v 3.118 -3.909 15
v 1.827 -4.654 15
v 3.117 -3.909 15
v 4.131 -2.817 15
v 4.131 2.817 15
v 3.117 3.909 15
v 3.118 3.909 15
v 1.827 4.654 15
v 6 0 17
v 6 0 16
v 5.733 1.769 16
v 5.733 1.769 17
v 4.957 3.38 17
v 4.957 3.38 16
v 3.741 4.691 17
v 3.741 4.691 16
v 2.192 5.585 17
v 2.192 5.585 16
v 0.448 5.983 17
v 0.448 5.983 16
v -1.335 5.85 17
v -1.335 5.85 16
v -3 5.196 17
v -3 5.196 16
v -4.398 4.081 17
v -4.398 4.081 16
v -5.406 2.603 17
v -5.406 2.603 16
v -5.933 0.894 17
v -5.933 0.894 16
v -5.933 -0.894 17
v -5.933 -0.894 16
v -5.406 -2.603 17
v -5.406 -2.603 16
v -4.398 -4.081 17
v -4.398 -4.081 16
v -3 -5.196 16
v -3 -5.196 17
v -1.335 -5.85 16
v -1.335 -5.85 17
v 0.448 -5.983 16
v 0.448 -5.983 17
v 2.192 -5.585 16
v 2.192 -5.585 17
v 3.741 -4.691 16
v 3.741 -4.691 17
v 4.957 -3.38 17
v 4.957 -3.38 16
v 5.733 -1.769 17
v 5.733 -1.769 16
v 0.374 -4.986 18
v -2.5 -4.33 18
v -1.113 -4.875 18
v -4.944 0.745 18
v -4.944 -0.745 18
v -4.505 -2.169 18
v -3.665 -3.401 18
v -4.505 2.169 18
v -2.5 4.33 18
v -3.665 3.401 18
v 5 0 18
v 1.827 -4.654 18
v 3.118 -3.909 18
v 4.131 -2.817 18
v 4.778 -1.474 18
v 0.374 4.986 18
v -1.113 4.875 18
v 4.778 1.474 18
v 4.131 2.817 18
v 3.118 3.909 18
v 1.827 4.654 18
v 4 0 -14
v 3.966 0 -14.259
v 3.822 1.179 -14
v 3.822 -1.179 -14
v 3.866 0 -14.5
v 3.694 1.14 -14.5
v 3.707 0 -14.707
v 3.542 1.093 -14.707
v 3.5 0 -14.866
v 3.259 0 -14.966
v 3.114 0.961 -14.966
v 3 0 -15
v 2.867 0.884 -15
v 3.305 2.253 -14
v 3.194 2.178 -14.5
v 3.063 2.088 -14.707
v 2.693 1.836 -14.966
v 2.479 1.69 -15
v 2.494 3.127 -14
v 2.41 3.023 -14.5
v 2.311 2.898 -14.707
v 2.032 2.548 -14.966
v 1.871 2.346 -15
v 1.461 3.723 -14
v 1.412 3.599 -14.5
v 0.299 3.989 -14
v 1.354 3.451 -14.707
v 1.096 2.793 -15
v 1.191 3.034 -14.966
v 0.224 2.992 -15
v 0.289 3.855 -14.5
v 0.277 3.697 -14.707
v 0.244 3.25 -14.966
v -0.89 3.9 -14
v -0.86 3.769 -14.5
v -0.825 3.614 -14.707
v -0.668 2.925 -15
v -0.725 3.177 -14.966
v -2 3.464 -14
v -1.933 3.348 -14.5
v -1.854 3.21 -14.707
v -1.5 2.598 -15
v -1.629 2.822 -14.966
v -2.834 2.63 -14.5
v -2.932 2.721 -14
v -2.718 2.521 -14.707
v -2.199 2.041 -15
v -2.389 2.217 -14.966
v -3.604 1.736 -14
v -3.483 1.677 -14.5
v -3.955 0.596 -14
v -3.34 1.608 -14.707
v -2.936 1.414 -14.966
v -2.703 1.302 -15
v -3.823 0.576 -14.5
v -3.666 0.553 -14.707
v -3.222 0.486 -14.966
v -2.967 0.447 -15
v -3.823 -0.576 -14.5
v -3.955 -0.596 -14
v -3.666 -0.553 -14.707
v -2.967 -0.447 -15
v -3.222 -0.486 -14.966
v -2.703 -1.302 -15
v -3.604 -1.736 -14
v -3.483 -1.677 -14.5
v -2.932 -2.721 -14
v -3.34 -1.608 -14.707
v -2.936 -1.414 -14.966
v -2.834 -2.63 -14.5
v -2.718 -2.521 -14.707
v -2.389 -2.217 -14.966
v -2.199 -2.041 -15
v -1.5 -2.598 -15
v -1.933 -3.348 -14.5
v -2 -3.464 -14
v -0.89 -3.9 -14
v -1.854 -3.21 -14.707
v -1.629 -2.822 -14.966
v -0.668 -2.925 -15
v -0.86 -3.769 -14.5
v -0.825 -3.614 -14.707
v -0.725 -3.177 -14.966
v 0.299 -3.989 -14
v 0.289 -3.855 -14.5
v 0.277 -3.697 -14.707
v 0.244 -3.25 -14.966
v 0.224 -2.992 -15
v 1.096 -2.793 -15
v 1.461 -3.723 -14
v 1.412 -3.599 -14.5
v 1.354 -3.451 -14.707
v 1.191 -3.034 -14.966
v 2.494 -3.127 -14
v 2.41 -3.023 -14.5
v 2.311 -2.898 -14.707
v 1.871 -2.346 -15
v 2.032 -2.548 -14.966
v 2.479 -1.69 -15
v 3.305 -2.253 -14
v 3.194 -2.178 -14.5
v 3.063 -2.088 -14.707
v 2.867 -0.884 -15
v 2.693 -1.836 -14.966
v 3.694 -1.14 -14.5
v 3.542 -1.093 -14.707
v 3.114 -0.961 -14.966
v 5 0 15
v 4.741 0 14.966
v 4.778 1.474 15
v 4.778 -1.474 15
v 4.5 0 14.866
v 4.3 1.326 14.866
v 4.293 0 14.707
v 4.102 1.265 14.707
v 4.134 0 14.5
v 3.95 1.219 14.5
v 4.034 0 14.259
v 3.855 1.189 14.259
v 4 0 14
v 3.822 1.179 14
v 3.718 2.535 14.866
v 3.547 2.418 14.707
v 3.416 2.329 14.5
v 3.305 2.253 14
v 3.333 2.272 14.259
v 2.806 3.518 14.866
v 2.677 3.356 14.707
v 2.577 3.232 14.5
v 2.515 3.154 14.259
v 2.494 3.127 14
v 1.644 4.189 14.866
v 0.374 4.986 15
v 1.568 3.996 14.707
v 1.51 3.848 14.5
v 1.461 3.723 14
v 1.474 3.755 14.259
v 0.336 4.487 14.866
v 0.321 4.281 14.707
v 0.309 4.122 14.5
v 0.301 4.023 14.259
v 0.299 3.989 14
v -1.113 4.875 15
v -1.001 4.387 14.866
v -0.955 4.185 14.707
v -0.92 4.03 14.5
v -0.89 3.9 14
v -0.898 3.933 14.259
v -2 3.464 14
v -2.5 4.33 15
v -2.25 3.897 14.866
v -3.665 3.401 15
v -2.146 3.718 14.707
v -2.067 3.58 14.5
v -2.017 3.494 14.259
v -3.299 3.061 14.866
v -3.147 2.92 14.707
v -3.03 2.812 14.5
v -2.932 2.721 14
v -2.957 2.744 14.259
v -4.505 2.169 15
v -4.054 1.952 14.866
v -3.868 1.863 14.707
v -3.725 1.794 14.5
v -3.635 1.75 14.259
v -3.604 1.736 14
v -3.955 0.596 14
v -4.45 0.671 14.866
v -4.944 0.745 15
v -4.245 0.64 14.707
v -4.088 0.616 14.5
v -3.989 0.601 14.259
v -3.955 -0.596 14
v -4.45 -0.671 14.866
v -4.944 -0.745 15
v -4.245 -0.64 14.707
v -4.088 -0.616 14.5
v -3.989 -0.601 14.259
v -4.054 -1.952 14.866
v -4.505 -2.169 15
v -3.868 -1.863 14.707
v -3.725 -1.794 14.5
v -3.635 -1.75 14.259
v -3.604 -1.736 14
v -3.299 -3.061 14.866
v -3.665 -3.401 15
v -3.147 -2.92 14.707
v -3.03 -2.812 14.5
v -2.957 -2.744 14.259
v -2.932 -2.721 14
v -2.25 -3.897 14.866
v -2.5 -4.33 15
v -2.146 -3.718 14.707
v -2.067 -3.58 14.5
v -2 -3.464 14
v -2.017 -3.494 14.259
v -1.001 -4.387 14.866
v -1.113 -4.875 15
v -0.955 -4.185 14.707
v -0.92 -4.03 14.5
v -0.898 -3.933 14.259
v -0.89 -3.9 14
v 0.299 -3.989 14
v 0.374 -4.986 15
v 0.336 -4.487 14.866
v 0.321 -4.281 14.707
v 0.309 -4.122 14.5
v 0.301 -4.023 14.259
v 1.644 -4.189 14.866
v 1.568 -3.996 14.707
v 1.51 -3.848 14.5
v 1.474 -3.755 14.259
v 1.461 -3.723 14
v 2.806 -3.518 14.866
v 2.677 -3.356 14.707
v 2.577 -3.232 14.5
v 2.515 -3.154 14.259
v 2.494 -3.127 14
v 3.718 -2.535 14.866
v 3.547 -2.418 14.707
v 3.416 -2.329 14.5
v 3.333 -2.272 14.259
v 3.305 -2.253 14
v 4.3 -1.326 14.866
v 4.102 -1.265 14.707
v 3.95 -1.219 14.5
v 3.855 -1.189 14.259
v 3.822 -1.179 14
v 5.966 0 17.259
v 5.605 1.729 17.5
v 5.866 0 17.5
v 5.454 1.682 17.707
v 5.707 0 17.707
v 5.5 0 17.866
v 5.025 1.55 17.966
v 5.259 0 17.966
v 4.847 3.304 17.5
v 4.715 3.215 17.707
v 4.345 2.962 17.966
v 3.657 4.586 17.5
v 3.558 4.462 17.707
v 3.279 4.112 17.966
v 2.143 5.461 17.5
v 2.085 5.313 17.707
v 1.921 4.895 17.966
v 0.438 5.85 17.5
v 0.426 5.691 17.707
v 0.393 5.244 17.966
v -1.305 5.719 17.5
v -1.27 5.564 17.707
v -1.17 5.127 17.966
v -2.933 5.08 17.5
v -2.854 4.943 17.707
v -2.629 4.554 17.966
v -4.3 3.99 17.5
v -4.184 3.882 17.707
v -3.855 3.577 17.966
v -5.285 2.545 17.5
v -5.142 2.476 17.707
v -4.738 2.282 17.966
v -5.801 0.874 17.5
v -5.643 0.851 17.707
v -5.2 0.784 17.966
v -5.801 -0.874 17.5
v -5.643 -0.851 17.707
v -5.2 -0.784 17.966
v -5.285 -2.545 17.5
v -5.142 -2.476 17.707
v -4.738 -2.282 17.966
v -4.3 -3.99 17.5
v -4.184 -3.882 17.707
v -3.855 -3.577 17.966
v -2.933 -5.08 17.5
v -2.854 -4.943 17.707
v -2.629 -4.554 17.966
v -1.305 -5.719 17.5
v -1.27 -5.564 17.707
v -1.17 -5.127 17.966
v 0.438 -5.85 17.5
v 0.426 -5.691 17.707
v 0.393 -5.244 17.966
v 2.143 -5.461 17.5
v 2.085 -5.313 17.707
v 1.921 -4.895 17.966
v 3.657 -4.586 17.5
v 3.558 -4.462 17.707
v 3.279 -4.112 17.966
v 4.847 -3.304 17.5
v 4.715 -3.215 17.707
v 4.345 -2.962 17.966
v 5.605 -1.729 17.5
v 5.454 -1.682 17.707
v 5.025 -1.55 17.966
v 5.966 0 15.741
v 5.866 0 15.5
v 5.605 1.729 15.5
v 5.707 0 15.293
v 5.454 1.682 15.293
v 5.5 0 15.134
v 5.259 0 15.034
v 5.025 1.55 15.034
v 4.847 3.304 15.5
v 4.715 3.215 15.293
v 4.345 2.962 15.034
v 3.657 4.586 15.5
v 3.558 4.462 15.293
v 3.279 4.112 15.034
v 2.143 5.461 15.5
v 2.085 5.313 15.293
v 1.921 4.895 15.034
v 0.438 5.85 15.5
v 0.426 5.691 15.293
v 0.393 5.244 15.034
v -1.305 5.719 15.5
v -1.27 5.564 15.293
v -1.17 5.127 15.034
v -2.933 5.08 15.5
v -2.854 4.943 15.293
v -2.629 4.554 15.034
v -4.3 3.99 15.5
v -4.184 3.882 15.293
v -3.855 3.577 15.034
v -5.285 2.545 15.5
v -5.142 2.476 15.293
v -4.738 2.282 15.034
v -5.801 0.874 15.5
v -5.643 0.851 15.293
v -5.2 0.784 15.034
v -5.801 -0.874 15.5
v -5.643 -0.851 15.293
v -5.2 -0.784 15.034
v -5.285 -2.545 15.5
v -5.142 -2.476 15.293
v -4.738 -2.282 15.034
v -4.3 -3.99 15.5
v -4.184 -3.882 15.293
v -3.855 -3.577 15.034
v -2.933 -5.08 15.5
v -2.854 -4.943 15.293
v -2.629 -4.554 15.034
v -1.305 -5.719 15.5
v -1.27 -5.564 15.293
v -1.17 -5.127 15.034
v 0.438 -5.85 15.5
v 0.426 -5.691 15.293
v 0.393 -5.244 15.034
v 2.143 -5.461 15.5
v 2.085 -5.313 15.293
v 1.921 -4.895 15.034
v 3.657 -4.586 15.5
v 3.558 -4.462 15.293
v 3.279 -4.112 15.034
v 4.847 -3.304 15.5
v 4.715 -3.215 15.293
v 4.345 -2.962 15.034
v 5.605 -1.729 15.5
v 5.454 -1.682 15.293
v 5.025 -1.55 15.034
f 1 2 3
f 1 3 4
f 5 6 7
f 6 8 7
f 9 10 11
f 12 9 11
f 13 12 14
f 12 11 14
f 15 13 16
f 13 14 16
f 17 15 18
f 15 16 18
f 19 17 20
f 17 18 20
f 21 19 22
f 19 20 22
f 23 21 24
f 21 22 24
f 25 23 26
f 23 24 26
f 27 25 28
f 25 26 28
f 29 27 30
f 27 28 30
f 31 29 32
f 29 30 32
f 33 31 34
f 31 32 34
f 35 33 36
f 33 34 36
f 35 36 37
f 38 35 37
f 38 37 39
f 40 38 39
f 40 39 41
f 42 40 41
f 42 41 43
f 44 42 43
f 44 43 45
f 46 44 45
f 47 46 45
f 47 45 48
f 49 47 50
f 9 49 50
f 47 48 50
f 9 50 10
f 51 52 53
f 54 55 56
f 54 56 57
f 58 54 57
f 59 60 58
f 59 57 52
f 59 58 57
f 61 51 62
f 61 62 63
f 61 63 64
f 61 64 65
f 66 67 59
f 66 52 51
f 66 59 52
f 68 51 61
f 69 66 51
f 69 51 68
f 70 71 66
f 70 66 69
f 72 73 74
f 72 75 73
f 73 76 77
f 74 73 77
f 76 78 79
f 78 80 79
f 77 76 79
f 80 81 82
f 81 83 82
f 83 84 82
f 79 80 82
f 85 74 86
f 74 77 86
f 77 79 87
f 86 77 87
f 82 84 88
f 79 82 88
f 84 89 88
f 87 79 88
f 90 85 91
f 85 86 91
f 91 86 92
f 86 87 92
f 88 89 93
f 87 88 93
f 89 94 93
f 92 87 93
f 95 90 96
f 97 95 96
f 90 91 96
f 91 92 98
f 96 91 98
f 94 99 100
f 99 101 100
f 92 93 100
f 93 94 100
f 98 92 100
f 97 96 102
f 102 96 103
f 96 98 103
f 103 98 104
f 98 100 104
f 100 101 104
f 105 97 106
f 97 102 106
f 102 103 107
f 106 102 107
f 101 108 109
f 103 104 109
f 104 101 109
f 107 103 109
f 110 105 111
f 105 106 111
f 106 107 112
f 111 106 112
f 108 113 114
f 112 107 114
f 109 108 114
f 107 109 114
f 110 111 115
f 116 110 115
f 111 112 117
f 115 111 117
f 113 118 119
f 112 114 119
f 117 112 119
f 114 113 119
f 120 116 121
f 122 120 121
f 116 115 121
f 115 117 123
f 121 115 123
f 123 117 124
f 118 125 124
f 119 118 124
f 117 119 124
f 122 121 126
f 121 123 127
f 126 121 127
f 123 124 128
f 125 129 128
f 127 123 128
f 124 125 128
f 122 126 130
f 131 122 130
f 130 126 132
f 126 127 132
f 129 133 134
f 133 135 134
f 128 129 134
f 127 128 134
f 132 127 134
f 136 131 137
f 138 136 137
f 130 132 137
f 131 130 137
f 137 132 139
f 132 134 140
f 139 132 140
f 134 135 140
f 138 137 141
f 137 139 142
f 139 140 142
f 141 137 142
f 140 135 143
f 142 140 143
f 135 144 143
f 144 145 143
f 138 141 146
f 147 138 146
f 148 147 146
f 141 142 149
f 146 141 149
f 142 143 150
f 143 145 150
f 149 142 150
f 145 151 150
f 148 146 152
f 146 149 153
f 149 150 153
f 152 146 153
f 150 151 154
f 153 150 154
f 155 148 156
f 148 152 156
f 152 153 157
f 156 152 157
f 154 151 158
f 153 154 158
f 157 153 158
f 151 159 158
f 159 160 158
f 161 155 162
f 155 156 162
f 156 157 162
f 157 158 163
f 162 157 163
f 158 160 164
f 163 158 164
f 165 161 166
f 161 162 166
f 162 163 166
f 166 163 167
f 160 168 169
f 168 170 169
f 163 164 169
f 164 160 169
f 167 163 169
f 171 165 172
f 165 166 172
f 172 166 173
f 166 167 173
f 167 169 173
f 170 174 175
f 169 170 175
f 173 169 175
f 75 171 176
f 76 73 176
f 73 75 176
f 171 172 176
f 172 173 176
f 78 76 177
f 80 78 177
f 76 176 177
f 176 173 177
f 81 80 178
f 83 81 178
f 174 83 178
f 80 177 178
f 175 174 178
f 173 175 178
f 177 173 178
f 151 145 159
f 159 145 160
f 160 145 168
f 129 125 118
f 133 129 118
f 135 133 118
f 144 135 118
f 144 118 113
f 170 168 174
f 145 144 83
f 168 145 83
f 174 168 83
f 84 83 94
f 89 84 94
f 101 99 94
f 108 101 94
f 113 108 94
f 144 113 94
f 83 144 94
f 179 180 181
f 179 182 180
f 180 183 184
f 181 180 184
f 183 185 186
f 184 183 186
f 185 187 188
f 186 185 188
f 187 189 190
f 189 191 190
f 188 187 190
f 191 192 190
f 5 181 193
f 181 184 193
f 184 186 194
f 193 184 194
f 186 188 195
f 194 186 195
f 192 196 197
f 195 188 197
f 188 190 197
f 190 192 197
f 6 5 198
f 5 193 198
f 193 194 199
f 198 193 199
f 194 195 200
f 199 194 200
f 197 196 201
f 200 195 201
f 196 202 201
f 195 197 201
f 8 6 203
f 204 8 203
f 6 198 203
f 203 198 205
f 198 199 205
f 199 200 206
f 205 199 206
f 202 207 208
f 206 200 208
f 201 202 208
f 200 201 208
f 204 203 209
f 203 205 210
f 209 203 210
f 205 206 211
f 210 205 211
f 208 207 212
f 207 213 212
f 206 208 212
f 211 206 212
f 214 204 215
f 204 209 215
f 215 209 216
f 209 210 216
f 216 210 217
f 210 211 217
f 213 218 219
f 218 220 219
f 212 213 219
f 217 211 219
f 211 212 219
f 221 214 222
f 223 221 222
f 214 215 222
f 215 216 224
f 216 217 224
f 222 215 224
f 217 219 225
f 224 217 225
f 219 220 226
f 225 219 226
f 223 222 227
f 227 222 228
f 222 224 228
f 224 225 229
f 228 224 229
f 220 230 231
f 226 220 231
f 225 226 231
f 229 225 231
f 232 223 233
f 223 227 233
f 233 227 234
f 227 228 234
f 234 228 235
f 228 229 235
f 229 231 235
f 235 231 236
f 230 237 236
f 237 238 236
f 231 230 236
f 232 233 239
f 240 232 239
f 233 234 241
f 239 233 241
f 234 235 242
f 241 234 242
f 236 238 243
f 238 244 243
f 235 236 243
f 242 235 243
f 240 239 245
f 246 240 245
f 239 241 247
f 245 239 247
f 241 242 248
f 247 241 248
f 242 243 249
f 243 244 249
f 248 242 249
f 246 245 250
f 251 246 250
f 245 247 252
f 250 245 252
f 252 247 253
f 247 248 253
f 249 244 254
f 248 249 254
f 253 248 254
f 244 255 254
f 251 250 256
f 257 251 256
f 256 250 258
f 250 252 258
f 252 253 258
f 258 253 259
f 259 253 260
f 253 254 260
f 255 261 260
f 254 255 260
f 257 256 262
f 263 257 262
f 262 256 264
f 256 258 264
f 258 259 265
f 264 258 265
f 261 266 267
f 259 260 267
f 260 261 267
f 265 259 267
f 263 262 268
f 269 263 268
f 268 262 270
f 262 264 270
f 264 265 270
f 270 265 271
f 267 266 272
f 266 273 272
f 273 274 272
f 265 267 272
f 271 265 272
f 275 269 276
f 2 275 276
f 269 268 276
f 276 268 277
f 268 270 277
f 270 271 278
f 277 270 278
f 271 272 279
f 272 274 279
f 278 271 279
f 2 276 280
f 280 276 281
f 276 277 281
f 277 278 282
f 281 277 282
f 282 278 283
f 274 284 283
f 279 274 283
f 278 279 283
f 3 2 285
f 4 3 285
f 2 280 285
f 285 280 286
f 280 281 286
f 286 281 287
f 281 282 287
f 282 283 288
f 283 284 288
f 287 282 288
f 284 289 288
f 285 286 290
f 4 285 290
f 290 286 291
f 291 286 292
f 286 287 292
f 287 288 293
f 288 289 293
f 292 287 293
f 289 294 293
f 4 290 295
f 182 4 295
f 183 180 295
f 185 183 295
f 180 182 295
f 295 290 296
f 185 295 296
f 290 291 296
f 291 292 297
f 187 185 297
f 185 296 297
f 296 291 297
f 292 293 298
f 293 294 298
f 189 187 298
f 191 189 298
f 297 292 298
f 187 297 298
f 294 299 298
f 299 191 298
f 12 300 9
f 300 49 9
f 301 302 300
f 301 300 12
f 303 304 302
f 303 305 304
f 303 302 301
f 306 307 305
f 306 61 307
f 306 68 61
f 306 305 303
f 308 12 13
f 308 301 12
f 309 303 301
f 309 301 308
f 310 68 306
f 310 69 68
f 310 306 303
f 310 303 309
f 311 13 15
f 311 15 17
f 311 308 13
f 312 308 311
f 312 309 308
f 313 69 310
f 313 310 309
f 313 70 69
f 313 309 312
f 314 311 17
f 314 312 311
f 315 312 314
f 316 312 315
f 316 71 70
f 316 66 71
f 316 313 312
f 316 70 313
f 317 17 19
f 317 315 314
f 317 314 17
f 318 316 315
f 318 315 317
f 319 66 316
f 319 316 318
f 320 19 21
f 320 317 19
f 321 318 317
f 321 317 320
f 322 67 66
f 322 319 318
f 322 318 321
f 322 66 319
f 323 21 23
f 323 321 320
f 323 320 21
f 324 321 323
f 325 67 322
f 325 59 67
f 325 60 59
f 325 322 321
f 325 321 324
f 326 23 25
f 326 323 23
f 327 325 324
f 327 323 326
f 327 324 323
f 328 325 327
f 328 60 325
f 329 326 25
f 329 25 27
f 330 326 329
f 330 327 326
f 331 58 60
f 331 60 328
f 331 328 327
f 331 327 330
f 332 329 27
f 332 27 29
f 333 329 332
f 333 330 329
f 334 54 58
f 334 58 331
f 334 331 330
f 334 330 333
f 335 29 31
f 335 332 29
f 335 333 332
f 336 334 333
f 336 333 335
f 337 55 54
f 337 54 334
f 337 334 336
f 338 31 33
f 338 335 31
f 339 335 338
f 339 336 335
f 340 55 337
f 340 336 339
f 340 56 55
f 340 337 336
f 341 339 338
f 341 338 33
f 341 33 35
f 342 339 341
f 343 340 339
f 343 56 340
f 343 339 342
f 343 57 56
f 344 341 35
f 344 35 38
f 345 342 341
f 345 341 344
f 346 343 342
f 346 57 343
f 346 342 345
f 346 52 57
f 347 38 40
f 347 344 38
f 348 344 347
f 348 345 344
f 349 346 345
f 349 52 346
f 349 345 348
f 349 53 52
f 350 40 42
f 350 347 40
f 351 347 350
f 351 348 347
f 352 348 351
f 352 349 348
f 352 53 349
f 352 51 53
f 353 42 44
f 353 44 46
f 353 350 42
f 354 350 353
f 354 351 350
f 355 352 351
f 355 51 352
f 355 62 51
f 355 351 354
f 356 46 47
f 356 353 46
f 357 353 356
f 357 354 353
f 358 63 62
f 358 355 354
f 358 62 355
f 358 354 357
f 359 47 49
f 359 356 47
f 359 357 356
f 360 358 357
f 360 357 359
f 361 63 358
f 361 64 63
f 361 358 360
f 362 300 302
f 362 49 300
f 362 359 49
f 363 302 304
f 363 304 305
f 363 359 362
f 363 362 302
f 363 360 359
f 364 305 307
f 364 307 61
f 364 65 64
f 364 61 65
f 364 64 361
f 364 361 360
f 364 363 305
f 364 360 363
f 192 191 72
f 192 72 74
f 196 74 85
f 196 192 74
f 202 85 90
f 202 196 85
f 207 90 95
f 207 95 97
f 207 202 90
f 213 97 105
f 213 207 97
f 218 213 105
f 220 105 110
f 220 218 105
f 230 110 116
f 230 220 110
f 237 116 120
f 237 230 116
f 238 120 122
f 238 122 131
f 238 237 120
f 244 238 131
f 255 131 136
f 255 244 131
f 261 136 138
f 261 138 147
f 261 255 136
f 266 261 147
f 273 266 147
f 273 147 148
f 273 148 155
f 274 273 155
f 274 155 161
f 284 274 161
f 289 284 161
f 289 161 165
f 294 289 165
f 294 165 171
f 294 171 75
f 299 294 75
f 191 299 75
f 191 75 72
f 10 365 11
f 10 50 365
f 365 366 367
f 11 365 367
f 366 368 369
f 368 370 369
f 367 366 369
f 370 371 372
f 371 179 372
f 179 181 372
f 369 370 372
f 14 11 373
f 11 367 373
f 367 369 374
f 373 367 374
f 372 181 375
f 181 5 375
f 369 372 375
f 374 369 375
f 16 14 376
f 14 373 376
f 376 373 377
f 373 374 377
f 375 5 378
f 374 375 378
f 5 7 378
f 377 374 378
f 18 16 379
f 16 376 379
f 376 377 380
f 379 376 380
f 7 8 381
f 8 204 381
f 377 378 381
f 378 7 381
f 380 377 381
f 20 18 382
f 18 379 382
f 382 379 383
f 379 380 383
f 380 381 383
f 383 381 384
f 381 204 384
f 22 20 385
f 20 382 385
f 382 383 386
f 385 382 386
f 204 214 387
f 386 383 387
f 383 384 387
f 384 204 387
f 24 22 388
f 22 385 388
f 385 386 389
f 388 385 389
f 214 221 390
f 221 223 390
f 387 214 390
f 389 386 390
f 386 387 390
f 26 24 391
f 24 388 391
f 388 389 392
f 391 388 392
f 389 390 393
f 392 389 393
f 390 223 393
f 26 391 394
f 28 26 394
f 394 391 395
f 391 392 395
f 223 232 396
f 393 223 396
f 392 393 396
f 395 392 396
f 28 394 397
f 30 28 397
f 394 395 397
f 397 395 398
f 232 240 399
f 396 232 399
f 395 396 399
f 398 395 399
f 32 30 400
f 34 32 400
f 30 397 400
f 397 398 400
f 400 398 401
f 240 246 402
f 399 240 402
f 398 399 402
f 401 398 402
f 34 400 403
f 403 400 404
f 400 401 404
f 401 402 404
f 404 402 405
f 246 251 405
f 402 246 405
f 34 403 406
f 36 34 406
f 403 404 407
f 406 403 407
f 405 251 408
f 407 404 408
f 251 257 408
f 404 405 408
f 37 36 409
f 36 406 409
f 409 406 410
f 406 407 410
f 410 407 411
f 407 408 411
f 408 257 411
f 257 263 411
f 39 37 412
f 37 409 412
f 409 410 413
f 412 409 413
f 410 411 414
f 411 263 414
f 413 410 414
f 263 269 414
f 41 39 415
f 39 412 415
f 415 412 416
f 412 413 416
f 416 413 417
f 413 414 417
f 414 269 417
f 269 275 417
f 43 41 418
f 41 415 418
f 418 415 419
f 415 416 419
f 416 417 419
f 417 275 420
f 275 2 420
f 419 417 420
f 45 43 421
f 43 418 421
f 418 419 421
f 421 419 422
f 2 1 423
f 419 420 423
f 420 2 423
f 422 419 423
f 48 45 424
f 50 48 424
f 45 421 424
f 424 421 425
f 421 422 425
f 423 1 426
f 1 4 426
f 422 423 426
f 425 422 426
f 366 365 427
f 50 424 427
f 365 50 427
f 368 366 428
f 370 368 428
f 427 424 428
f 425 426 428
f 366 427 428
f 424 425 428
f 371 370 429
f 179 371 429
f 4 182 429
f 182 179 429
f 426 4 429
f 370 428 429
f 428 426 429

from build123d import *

# Parameters (mm, degrees)
SKETCH1_R           = 4
BOSS_EXTRUDE1_DEPTH = 15
SKETCH2_R           = 6
BOSS_EXTRUDE2_DEPTH = 3
FILLET1_R           = 1


with BuildPart() as part:
    # Sketch1 → Boss-Extrude1 (new, symmetric)
    with BuildSketch(Plane.XY):
        Circle(SKETCH1_R)
    extrude(amount=BOSS_EXTRUDE1_DEPTH, both=True)

    # Sketch2 → Boss-Extrude2 (add)
    with BuildSketch(Plane.XY.offset(15)):
        Circle(SKETCH2_R)
    extrude(amount=BOSS_EXTRUDE2_DEPTH)

    # Fillet1
    fillet1_edges = [part.edges().sort_by_distance(p)[0] for p in [
        (-4, 0, -15),
        (-4, 0, 15),
        (-6, 0, 15),
        (-6, 0, 18),
    ]]
    fillet(fillet1_edges, radius=FILLET1_R - 0.0001)  # a hair under: the kernel refuses the full size


solid = part.part
